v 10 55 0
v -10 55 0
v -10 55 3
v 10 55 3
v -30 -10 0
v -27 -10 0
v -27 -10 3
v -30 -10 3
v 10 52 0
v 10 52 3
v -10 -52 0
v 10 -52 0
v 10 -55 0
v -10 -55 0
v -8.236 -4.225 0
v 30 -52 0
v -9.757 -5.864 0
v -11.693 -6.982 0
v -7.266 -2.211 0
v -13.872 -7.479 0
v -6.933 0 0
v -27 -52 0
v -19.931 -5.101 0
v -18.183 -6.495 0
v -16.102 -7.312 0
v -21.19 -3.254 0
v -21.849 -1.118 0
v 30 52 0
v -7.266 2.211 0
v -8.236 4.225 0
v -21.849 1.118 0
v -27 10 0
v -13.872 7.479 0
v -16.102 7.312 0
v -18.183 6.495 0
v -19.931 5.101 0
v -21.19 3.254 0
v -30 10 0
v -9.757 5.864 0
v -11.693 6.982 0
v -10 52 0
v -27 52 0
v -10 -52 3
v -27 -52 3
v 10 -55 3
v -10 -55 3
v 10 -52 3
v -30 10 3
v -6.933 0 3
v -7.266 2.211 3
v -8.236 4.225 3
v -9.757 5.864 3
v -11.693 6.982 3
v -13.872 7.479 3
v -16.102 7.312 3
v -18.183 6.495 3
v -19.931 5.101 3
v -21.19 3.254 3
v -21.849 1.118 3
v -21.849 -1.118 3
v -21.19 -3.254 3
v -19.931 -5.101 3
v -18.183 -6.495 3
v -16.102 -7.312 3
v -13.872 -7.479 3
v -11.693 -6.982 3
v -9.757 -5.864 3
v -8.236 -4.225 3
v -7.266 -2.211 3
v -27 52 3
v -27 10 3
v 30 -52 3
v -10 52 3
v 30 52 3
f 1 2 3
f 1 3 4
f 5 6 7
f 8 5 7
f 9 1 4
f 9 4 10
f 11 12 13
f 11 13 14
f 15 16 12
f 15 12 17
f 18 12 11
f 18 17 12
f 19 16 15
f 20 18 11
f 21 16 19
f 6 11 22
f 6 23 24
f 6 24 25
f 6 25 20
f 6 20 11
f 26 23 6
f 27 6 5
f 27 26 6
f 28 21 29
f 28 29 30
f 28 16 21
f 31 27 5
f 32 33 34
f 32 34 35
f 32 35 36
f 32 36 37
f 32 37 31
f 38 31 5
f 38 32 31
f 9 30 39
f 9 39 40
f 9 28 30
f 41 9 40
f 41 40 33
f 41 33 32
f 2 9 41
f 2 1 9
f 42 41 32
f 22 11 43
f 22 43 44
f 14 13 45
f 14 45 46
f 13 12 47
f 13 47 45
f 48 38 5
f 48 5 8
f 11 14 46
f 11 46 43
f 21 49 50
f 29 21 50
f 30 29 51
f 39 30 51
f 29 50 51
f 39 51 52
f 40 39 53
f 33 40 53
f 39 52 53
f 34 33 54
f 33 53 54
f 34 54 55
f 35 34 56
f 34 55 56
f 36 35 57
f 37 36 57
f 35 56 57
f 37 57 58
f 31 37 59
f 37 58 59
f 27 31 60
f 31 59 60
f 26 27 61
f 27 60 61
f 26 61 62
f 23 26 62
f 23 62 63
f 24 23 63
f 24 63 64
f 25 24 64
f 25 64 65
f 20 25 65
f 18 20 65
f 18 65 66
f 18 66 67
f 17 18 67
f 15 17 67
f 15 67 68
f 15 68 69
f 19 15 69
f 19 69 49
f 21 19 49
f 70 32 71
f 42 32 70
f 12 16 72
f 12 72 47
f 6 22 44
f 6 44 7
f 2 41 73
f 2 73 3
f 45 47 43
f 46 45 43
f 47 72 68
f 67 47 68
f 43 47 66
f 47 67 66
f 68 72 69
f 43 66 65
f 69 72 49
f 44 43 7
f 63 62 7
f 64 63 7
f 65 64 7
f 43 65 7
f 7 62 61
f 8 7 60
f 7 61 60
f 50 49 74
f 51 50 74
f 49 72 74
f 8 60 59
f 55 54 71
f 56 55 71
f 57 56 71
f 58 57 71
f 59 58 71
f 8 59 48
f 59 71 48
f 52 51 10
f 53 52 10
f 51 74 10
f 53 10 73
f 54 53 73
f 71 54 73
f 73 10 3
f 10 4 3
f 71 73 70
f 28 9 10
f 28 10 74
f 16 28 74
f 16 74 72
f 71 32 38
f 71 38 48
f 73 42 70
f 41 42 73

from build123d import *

# Parameters (mm, degrees)
BOSS_EXTRUDE1_DEPTH = 3
SKETCH3_R           = 7.5
CUT_EXTRUDE1_DEPTH  = 10
SKETCH4_W           = 3
SKETCH4_H           = 20
BOSS_EXTRUDE2_DEPTH = 3


with BuildPart() as part:
    # Sketch1 → Boss-Extrude1 (new body)
    with BuildSketch(Plane.XY):
        Polygon((-10, 52), (-10, 55), (10, 55), (10, 52), (30, 52), (30, -52), (10, -52), (10, -55), (-10, -55), (-10, -52), (-27, -52), (-27, 52), align=None)
    extrude(amount=BOSS_EXTRUDE1_DEPTH)

    # Sketch3 → Cut-Extrude1 (cut)
    with BuildSketch(Plane.XY.offset(3)):
        with Locations((-14.432858662, 0)):
            Circle(SKETCH3_R)
    extrude(amount=-CUT_EXTRUDE1_DEPTH, mode=Mode.SUBTRACT)

    # Sketch4 → Boss-Extrude2 (add)
    with BuildSketch(Plane.ZY.offset(27)):
        with Locations((1.5, 0)):
            Rectangle(SKETCH4_W, SKETCH4_H)
    extrude(amount=BOSS_EXTRUDE2_DEPTH)


solid = part.part
